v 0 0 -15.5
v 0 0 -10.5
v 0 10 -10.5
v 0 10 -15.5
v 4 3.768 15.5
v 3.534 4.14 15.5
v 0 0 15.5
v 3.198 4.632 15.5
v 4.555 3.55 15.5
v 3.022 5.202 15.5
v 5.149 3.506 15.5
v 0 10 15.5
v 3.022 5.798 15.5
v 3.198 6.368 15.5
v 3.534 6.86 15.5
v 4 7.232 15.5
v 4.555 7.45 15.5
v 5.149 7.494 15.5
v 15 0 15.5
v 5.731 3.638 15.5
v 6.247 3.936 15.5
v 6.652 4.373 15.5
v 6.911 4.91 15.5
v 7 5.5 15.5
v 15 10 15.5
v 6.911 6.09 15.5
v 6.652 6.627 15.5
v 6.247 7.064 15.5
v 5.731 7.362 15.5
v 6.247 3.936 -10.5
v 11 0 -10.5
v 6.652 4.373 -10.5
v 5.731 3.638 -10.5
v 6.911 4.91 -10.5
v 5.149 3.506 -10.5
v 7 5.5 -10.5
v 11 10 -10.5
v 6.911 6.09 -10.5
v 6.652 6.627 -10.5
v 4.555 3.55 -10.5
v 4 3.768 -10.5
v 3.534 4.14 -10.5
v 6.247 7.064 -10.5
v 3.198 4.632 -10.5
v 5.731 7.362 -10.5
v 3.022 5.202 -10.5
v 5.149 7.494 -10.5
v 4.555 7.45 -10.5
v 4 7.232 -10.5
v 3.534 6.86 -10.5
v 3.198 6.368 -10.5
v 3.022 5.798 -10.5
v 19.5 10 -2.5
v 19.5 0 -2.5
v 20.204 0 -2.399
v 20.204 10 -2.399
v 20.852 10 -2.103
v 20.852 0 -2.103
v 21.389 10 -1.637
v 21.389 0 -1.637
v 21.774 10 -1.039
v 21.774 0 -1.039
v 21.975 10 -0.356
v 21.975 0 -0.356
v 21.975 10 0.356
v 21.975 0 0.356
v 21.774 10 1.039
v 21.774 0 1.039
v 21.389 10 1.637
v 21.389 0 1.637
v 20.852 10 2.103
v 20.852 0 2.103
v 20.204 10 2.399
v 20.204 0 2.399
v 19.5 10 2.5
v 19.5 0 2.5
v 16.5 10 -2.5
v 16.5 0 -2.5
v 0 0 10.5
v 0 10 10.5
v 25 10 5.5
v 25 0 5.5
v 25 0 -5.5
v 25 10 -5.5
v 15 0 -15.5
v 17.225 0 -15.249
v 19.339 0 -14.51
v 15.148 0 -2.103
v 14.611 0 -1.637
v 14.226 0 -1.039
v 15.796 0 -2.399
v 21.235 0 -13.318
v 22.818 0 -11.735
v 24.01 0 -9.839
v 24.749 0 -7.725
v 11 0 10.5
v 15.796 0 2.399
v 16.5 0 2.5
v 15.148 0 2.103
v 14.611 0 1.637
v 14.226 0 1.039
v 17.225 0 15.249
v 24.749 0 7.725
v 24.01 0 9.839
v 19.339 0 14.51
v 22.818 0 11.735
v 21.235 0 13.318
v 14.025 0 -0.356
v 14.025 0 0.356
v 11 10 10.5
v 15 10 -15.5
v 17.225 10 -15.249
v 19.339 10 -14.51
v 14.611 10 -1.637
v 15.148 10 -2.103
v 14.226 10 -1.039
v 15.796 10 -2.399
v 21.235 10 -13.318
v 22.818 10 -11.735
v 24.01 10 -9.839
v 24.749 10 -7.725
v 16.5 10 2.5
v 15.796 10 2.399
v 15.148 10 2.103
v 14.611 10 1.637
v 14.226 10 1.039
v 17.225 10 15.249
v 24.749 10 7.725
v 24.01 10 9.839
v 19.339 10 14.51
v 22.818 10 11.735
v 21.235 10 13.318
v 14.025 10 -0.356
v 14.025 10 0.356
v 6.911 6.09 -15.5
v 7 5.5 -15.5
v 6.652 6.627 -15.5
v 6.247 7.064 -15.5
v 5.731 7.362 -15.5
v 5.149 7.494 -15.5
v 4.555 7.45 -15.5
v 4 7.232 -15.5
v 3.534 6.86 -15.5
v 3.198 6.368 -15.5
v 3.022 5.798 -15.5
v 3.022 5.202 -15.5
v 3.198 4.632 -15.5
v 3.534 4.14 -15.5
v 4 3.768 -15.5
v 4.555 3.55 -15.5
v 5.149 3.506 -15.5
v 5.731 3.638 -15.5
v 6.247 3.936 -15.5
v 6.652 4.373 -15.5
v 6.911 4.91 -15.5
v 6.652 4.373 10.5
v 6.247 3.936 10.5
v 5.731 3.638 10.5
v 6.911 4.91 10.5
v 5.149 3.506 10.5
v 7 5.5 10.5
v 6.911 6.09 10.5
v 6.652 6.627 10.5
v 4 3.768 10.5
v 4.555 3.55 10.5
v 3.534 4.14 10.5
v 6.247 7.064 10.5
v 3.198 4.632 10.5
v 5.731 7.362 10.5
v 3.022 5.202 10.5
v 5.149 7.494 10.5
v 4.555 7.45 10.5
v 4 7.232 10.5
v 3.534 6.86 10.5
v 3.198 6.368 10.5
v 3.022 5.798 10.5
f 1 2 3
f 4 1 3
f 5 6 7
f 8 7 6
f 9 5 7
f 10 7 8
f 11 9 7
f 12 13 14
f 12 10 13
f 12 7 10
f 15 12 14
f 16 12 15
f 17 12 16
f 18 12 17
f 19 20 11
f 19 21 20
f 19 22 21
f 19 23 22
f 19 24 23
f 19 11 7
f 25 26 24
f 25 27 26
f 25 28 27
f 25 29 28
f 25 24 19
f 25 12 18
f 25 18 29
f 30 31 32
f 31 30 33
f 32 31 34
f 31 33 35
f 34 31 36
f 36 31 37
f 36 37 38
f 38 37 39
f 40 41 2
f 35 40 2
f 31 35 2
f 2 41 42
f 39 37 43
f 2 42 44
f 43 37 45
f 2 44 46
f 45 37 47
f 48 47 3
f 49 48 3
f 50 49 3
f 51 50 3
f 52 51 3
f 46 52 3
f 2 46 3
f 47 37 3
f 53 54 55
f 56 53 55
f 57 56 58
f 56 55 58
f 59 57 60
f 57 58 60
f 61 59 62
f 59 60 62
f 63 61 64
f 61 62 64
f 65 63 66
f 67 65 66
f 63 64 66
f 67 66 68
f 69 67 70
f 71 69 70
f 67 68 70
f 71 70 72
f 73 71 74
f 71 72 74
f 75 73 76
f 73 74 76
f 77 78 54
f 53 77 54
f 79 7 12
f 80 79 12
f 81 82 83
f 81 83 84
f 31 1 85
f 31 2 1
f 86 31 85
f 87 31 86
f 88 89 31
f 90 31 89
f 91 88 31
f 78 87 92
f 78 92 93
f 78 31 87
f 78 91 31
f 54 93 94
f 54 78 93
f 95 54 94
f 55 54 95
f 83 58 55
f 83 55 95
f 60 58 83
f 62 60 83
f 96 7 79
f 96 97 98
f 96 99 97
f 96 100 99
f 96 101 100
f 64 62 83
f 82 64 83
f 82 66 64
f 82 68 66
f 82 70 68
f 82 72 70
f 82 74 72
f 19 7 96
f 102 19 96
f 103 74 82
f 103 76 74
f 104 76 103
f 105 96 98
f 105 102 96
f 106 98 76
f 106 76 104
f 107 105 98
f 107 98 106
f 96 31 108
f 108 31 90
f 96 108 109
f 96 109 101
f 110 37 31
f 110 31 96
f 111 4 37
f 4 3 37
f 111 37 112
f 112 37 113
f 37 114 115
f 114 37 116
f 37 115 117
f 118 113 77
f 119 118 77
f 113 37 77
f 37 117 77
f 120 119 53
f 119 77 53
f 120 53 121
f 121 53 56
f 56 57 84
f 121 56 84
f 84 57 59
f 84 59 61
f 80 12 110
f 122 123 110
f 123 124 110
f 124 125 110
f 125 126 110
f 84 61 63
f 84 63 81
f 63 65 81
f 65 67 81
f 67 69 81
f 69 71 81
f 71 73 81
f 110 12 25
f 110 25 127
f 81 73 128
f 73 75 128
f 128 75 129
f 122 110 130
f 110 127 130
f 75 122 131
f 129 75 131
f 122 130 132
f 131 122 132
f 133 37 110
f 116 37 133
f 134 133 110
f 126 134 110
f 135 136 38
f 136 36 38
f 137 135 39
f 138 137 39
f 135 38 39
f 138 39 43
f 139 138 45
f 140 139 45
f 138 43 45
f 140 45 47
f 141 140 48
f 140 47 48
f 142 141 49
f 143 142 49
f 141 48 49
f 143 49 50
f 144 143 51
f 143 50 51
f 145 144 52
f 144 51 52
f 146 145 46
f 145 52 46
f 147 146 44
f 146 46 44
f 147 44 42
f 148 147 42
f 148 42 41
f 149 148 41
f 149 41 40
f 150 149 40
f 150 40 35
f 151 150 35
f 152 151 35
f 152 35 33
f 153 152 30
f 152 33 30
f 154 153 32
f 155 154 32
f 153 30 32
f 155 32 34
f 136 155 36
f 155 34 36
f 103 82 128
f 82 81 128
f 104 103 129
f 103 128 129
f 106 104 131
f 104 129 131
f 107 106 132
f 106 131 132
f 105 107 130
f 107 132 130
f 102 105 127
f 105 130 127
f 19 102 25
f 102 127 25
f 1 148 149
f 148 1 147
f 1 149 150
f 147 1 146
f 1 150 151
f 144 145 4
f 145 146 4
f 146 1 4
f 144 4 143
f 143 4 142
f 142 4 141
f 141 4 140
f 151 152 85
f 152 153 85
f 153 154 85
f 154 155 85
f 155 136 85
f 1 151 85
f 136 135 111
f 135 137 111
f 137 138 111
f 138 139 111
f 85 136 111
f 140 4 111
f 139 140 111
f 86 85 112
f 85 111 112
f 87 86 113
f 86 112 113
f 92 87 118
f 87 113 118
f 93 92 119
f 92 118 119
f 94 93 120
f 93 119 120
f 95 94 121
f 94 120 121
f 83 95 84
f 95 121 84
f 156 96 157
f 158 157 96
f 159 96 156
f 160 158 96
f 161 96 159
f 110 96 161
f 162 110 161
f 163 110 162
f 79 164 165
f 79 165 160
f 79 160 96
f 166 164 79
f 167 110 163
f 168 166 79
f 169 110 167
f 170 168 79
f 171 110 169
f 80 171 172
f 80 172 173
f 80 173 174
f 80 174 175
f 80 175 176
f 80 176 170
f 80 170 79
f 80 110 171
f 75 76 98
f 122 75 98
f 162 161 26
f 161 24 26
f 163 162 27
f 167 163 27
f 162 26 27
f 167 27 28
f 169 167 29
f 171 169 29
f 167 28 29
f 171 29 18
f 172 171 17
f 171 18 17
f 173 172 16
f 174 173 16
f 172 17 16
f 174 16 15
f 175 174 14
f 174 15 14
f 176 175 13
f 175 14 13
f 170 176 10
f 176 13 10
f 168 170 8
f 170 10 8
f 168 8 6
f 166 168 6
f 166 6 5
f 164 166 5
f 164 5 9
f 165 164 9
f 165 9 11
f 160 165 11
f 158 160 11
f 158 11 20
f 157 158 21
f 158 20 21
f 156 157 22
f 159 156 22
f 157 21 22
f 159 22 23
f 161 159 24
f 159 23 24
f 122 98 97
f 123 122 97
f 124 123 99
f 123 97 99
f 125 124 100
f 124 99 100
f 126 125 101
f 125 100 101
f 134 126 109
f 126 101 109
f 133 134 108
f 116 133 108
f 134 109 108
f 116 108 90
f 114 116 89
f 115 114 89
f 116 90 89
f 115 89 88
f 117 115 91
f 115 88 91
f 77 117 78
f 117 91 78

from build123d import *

# Parameters (mm, degrees)
F0_W      = 25
F0_H      = 10
F1_DEPTH  = 15.5
F2_W      = 11
F2_H      = 21
F3_DEPTH  = 10.001
F4_R      = 2.5
F5_DEPTH  = 10.001
F6_R      = 10
F7_R      = 2
F8_DEPTH  = 16
F10_DEPTH = 25


with BuildPart() as f1:
    # F0 (on Top) → F1 (new body, symmetric)
    with BuildSketch(Plane.XY):
        with Locations((12.5, 5)):
            Rectangle(F0_W, F0_H)
    extrude(amount=F1_DEPTH, both=True)

    # F2 (on face) → F3 (cut, through all)
    with BuildSketch(Plane(origin=(0, 10, 0), x_dir=(-1, 0, 0), z_dir=(0, 1, 0))):
        with Locations((-5.5, 0)):
            Rectangle(F2_W, F2_H)
    extrude(amount=-F3_DEPTH, mode=Mode.SUBTRACT)

    # F4 (on face) → F5 (cut, through all)
    with BuildSketch(Plane(origin=(0, 10, 0), x_dir=(-1, 0, 0), z_dir=(0, 1, 0))):
        with Locations((-18, 0)):
            Circle(F4_R)
    extrude(amount=-F5_DEPTH, mode=Mode.SUBTRACT)

    # F6
    f6_edges = [f1.edges().sort_by_distance(p)[0] for p in [
        (25, 5, -15.5),
        (25, 5, 15.5),
    ]]
    fillet(f6_edges, radius=F6_R)

    # F7 (on Top) → F8 (cut, symmetric)
    with BuildSketch(Plane.XY):
        with Locations((5, 5.5)):
            Circle(F7_R)
    extrude(amount=F8_DEPTH, both=True, mode=Mode.SUBTRACT)

    # F9 (on face) → F10 (cut)
    with BuildSketch(Plane.XZ):
        with BuildLine():
            Line((19.5, 2.5), (16.5, 2.5))
            ThreePointArc((16.5, 2.5), (14, 0), (16.5, -2.5))
            Line((16.5, -2.5), (19.5, -2.5))
            ThreePointArc((19.5, -2.5), (22, 0), (19.5, 2.5))
        make_face()
    extrude(amount=-F10_DEPTH, mode=Mode.SUBTRACT)


solid = f1.part
